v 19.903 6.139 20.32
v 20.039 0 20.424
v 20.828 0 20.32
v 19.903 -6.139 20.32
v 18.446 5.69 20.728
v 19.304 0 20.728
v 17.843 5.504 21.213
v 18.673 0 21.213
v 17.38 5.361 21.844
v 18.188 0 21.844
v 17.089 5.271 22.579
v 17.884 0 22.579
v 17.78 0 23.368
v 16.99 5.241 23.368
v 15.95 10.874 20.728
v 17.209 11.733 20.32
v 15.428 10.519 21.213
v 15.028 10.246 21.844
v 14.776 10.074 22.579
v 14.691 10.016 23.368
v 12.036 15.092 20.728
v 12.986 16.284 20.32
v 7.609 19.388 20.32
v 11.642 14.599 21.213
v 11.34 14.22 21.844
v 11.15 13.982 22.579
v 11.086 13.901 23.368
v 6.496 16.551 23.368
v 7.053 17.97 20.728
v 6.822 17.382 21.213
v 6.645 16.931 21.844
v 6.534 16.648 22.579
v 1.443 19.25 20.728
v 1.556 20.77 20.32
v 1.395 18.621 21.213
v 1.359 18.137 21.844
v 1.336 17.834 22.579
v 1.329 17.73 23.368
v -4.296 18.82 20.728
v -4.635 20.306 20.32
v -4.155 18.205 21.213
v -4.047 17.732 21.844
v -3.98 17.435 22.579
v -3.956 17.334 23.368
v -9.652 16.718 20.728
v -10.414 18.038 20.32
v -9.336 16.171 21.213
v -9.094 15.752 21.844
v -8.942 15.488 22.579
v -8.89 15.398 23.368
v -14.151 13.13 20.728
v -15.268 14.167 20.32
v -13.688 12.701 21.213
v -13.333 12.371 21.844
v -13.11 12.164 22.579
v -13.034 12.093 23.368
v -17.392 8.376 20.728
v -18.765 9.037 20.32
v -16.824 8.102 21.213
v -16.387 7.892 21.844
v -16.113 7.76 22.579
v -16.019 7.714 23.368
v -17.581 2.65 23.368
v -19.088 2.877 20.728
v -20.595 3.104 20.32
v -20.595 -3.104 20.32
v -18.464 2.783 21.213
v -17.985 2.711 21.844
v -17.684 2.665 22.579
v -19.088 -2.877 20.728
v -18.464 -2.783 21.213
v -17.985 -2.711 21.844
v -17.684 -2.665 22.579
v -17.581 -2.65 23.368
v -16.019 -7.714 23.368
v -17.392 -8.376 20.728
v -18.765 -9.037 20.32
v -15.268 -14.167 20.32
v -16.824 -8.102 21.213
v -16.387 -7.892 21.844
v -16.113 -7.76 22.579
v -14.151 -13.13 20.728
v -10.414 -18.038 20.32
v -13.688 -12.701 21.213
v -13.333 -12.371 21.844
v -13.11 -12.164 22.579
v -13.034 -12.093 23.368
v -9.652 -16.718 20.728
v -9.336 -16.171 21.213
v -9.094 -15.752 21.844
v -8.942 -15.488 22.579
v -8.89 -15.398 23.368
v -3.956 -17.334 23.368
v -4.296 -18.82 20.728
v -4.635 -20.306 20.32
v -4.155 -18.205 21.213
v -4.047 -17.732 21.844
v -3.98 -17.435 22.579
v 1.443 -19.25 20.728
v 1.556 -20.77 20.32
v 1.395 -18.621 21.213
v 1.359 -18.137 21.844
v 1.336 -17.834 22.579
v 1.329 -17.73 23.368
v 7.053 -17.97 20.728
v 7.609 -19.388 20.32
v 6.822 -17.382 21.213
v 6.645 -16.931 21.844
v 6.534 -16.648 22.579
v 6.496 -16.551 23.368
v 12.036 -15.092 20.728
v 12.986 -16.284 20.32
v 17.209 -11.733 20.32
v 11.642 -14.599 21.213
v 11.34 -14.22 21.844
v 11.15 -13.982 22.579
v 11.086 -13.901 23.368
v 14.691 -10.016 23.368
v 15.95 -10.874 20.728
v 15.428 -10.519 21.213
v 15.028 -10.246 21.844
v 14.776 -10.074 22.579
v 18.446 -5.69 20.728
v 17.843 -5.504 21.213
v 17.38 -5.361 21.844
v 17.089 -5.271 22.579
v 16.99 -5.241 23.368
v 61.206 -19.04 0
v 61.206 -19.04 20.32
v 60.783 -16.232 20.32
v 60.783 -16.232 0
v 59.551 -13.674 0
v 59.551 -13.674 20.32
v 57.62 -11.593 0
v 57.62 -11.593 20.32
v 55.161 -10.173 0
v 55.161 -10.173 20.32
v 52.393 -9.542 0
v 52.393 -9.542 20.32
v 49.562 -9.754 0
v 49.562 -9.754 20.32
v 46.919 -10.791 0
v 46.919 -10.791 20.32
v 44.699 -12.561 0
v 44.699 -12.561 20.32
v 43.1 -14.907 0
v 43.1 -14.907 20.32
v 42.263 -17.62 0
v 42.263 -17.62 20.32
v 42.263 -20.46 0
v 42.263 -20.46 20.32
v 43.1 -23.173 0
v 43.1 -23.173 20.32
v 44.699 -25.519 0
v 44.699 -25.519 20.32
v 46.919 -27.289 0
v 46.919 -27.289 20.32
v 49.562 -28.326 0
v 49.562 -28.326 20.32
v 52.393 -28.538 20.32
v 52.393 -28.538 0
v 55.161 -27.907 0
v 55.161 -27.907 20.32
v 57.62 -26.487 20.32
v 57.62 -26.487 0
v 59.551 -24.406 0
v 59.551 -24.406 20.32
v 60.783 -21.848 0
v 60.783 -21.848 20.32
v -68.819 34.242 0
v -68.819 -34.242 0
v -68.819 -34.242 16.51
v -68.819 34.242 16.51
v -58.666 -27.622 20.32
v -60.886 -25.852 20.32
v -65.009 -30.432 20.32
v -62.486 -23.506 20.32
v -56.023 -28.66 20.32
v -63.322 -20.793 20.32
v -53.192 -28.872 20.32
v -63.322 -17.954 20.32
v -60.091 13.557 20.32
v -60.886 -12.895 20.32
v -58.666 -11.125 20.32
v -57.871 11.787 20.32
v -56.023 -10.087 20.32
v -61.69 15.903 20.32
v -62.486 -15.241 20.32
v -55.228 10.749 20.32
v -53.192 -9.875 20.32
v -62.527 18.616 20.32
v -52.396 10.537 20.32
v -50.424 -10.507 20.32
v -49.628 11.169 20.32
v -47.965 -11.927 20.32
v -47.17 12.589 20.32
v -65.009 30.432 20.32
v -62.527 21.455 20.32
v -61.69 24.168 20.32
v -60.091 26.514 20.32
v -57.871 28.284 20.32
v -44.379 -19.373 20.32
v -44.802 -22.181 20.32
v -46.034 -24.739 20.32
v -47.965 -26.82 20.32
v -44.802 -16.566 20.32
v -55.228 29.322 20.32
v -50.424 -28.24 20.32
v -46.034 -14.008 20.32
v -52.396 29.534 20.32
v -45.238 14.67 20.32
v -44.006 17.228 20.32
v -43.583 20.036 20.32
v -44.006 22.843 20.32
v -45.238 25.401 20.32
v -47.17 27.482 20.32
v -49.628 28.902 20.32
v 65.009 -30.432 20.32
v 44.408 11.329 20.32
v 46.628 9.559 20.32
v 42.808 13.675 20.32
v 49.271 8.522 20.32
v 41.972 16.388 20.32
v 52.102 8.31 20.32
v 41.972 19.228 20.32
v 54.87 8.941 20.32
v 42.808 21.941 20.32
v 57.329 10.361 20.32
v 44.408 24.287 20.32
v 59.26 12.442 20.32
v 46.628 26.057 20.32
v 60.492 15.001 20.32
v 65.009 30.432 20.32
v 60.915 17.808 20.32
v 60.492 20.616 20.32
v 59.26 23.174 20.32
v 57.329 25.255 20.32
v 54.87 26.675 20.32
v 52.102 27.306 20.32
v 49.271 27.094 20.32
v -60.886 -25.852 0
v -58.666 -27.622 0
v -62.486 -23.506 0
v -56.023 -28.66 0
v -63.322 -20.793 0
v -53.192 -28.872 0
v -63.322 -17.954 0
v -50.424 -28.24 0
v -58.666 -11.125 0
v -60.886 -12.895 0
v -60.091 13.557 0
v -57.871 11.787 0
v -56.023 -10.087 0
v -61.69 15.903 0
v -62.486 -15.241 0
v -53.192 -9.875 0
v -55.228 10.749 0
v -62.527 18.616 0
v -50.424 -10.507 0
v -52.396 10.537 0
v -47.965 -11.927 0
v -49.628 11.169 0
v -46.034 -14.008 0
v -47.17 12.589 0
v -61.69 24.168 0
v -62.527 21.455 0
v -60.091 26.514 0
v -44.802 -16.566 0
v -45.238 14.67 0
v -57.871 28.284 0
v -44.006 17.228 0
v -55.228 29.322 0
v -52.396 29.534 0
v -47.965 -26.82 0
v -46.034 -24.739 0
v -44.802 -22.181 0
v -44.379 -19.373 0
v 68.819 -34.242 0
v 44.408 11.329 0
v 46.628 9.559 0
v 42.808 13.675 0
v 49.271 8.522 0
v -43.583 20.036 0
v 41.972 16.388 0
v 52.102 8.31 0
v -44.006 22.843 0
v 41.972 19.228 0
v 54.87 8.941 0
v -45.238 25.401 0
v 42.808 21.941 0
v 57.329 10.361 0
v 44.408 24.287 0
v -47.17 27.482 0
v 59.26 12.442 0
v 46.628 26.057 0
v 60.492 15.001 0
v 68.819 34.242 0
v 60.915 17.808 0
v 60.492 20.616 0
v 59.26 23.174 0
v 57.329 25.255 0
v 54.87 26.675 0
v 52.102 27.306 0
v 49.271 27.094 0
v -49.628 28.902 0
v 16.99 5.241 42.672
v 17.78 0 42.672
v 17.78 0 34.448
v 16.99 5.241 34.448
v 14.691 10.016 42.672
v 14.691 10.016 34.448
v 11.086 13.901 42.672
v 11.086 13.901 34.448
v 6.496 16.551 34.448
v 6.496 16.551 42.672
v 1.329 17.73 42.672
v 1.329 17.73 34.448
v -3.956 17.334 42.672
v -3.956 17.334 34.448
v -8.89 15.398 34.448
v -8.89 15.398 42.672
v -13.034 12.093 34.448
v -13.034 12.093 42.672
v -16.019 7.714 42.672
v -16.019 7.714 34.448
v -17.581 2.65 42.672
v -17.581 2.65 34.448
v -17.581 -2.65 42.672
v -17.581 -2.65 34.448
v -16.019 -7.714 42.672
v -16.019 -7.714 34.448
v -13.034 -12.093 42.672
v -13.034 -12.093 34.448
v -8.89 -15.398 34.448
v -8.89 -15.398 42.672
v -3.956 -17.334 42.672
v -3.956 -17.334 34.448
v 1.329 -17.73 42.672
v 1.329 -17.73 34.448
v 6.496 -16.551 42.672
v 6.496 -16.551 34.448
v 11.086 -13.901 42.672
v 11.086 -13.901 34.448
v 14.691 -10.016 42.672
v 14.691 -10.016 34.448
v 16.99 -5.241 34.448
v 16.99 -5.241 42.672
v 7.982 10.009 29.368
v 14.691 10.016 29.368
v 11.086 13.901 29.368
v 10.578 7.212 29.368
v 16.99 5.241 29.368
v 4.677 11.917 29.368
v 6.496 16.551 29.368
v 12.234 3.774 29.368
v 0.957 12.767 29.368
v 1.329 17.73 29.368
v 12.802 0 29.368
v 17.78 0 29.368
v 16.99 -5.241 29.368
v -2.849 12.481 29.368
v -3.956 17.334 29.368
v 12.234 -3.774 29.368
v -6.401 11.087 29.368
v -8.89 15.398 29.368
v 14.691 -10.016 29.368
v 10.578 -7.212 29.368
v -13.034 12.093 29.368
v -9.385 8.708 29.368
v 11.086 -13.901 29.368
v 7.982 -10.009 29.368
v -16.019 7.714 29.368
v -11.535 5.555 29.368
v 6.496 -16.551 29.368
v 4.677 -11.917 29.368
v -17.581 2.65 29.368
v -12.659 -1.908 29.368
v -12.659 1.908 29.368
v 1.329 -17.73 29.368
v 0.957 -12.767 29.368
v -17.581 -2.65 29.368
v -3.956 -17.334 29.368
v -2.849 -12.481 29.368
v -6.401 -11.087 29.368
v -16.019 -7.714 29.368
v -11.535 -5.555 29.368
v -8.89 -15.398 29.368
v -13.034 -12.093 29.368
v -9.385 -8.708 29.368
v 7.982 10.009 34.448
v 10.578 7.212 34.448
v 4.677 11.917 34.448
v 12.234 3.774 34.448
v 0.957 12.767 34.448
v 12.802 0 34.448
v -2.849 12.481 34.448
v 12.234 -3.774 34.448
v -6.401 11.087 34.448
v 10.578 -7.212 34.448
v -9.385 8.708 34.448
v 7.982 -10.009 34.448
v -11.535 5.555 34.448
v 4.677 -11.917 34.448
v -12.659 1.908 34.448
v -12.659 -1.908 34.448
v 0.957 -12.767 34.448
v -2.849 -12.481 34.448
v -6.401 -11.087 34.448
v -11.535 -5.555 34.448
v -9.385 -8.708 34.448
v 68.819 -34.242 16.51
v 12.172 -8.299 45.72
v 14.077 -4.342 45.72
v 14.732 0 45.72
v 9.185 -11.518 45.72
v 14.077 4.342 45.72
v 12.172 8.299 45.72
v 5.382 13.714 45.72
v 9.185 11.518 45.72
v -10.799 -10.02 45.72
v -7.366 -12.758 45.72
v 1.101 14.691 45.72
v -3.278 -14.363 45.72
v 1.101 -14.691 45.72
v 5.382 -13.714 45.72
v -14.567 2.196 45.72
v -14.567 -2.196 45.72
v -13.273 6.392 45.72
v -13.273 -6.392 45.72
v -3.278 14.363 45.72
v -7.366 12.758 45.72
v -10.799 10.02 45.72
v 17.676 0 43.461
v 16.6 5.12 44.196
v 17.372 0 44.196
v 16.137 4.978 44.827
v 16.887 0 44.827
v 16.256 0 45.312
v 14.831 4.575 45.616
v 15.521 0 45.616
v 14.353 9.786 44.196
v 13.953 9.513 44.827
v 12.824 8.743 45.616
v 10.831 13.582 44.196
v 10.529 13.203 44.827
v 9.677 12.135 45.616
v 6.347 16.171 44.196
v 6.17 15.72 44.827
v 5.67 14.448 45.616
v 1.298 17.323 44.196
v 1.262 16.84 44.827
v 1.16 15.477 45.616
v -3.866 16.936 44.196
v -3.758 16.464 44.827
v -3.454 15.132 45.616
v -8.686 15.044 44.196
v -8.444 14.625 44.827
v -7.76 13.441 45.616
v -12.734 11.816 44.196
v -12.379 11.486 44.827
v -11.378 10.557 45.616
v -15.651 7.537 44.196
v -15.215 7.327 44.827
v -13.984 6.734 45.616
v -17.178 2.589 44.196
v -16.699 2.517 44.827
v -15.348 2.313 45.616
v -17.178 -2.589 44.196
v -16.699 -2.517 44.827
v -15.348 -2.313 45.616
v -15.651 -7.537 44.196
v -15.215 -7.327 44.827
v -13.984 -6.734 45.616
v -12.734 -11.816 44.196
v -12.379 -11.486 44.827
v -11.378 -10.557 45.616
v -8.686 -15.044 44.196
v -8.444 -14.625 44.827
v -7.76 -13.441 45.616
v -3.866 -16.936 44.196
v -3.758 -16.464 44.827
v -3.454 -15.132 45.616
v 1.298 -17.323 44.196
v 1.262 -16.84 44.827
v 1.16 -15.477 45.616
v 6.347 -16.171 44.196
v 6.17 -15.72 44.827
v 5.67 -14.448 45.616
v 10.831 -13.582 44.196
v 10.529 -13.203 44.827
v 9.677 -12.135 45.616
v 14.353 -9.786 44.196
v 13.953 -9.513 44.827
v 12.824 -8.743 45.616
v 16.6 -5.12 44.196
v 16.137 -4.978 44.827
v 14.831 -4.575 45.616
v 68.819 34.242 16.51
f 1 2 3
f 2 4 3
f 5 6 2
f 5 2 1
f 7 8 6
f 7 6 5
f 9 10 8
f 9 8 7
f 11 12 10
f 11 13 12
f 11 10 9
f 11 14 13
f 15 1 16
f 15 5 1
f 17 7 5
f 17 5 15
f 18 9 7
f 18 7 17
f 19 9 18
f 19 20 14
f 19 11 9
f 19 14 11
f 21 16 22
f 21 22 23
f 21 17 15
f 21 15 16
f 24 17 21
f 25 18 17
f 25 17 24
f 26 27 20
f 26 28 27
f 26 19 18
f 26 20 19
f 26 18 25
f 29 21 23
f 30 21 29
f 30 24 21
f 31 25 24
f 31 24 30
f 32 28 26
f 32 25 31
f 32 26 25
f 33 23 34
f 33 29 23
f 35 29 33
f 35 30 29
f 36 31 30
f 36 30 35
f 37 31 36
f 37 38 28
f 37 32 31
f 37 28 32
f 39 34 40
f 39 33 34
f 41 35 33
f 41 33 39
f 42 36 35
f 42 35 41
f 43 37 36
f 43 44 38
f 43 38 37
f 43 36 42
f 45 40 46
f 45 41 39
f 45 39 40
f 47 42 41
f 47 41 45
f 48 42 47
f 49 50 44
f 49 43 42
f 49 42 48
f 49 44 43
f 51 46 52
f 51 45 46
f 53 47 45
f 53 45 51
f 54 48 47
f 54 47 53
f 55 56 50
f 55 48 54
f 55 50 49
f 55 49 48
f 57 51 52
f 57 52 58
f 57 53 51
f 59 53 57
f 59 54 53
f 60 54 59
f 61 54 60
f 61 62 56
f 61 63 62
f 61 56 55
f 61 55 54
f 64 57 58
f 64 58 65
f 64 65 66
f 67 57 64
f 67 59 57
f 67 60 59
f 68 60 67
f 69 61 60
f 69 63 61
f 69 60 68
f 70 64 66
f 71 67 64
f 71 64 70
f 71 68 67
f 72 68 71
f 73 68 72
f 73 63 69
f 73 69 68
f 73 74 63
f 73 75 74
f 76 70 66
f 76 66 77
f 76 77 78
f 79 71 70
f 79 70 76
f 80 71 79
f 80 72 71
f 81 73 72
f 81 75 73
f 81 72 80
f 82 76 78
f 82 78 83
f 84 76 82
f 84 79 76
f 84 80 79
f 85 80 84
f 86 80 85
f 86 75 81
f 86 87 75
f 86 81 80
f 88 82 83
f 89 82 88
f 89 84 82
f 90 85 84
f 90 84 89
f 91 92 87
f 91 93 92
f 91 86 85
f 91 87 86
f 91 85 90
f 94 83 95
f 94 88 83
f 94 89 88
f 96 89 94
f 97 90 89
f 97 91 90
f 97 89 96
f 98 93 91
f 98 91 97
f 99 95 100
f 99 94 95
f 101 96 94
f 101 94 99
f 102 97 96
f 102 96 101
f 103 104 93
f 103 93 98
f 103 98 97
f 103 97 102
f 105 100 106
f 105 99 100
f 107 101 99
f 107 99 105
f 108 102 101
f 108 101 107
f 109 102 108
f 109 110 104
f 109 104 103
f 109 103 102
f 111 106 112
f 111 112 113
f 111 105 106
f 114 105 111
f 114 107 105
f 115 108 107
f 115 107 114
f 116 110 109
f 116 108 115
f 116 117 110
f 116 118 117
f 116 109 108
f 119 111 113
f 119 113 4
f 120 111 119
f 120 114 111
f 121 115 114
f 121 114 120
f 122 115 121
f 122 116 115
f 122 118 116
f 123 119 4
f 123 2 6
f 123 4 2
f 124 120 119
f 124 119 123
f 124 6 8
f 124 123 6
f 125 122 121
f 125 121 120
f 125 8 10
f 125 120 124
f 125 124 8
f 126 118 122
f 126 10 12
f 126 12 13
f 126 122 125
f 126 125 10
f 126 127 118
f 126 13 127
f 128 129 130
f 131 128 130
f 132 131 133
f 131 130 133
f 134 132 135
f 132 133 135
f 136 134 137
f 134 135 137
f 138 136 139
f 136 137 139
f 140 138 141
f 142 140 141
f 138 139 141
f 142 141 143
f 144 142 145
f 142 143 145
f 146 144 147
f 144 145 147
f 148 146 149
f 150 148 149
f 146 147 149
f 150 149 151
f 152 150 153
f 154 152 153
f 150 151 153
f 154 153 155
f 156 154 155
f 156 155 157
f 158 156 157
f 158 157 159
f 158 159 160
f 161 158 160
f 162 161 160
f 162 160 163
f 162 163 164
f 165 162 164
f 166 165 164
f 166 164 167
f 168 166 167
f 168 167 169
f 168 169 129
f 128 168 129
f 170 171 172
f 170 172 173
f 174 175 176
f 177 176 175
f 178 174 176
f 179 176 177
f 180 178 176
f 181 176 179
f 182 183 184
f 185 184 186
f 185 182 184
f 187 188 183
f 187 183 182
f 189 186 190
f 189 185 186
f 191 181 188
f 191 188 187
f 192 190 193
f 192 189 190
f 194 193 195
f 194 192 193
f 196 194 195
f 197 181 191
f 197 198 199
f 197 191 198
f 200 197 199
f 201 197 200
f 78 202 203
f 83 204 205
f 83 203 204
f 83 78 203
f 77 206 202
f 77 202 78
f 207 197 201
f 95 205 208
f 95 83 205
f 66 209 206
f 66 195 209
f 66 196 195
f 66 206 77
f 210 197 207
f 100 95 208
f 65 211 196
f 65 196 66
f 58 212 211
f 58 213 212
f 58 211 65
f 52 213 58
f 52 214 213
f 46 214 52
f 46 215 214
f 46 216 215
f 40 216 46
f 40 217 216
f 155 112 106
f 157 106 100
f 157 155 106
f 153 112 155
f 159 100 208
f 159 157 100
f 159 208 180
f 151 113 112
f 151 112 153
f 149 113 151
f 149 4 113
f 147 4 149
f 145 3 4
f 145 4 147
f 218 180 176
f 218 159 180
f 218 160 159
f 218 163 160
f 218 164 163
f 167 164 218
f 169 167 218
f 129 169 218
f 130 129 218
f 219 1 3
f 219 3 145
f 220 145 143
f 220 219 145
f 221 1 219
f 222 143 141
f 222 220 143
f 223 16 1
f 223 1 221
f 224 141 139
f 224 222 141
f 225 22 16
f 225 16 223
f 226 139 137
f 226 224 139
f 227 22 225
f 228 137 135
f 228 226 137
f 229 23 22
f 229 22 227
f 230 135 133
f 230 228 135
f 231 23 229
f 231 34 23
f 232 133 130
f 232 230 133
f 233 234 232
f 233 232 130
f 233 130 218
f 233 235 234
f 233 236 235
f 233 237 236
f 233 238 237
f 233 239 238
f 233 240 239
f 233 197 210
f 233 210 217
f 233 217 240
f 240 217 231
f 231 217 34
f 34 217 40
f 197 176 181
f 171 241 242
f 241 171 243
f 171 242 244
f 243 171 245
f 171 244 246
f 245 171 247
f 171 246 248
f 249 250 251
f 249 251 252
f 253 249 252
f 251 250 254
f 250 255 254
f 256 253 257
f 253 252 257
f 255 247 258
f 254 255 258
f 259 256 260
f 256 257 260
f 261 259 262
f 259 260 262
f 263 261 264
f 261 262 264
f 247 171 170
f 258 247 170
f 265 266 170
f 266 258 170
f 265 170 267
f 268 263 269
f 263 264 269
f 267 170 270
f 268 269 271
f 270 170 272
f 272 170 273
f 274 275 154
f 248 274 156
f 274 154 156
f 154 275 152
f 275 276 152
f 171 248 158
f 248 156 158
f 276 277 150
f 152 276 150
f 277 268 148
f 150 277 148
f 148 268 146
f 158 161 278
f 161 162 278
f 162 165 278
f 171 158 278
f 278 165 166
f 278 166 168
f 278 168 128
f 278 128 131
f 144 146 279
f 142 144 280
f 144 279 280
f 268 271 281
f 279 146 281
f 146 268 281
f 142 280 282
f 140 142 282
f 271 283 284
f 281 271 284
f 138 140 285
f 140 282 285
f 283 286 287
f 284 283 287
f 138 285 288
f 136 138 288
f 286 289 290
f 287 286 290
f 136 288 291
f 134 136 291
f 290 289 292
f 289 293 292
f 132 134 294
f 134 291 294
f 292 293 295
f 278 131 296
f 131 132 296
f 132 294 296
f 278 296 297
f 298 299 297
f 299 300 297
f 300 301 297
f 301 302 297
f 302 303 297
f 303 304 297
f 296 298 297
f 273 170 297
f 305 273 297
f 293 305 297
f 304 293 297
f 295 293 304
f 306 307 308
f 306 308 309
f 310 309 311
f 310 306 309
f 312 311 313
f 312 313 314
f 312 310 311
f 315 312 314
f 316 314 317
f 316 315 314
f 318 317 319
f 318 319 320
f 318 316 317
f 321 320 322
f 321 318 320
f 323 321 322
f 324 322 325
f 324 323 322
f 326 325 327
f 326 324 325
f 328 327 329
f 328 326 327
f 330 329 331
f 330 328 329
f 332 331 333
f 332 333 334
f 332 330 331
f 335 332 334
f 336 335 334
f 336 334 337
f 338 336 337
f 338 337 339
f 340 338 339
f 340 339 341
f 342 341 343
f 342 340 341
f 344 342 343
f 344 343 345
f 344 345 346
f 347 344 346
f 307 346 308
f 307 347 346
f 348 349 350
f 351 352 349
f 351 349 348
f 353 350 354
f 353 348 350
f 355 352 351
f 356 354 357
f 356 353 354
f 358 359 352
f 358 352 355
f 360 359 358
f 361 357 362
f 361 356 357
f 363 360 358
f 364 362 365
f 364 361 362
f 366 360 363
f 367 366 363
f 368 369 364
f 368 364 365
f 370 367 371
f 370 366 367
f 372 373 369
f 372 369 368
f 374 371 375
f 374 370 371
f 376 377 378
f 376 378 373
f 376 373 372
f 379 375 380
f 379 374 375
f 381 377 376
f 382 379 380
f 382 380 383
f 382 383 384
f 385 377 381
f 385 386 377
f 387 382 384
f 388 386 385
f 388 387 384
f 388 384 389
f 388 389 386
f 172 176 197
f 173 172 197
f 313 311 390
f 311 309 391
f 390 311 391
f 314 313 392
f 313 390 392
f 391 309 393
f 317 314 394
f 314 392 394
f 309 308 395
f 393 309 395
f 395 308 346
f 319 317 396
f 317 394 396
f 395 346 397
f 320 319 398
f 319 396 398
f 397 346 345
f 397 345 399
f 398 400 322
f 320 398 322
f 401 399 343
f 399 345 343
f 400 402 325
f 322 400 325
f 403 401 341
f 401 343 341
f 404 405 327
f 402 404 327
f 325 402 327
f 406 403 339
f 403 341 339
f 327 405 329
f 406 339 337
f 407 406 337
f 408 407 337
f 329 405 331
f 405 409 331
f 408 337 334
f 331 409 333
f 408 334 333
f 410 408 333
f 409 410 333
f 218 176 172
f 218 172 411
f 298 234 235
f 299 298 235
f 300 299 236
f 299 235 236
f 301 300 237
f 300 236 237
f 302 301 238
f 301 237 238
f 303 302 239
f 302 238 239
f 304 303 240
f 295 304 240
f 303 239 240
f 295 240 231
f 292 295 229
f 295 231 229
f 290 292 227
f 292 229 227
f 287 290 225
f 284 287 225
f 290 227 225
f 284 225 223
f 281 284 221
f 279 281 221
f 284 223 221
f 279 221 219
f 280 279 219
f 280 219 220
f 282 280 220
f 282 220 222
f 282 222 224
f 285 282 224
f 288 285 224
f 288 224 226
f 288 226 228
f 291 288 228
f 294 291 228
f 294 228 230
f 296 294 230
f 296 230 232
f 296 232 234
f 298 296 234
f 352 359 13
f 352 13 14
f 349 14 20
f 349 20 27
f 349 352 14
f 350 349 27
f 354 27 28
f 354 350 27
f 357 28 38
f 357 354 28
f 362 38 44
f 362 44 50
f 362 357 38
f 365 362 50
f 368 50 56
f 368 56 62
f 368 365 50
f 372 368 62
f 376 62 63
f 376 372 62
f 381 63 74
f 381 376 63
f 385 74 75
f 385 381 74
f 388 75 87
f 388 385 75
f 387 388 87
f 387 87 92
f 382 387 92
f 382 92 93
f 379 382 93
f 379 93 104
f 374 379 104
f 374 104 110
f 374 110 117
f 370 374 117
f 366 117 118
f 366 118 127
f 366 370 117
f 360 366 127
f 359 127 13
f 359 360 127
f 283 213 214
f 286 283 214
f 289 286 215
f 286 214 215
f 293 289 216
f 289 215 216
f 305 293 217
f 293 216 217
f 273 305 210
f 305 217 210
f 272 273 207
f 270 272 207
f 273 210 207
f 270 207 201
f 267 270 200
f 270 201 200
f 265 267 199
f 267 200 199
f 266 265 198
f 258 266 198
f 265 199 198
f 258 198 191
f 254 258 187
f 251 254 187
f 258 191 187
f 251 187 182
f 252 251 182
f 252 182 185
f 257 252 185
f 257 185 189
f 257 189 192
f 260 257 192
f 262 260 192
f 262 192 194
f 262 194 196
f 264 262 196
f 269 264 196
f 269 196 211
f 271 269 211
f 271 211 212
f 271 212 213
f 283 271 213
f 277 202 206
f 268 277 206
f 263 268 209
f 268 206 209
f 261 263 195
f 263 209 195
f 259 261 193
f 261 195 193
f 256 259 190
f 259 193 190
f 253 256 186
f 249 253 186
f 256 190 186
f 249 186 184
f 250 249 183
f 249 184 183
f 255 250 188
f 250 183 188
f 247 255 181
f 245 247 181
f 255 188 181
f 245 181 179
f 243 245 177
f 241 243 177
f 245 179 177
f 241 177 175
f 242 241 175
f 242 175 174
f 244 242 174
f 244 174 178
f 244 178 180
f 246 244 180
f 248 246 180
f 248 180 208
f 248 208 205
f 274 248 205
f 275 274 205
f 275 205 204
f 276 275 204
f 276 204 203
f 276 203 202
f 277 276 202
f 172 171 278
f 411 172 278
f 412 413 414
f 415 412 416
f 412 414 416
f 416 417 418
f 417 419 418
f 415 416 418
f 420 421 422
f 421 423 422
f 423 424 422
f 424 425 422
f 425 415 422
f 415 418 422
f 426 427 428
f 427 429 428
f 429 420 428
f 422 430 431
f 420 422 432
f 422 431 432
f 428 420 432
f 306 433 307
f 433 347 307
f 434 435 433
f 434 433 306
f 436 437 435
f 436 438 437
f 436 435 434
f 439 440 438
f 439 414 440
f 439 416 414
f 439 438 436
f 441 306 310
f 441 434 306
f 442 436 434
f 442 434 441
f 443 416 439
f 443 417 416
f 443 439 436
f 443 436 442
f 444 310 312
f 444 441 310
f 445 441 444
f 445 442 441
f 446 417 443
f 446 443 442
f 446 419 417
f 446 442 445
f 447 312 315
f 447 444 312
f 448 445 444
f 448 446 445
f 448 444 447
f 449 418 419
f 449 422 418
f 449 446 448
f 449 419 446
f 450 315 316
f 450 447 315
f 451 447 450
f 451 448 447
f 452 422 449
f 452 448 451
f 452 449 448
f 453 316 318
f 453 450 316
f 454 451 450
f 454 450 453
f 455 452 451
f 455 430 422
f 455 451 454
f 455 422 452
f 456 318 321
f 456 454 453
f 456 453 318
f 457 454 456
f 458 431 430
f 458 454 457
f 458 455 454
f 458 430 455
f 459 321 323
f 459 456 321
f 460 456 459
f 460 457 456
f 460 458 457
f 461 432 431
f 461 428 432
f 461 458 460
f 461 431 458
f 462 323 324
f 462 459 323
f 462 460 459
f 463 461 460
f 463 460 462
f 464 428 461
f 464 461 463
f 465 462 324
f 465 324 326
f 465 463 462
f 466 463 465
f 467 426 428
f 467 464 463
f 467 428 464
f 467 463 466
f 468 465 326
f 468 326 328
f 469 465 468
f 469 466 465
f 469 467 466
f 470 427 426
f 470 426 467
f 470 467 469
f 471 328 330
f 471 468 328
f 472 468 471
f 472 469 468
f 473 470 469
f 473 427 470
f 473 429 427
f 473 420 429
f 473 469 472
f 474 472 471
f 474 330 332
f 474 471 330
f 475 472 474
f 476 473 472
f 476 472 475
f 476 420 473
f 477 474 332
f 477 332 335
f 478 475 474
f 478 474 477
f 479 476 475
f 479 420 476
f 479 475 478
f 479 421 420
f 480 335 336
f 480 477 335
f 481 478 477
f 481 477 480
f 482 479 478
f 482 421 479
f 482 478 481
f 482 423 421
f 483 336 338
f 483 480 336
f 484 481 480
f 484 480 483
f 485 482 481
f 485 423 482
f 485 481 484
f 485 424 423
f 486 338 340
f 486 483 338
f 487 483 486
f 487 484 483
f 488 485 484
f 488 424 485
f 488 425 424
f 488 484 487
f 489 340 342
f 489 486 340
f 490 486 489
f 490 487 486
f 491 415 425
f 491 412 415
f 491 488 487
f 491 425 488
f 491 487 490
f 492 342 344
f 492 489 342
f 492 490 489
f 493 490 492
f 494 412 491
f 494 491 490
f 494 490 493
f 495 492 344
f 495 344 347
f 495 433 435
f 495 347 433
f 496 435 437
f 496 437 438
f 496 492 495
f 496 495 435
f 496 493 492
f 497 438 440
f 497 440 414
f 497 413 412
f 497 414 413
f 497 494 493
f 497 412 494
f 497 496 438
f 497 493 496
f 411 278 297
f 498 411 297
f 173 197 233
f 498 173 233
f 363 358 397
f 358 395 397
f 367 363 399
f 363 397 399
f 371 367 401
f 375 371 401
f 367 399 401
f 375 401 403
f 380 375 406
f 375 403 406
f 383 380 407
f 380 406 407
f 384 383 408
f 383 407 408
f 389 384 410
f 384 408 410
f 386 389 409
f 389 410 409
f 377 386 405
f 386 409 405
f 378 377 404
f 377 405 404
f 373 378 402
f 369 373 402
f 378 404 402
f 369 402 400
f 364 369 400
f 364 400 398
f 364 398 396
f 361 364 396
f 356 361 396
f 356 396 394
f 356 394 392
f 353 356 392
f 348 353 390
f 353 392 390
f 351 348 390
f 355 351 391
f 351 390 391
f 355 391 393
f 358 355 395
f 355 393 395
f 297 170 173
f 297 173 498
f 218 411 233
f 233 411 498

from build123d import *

# Parameters (mm, degrees)
F0_W     = 137.63725
F0_H     = 68.484548
F1_DEPTH = 20.32
F2_R     = 9.525
F3_DEPTH = 25.4
F4_W     = 17.78
F4_H     = 25.4
F6_W     = 5.08
F6_H     = 5.08
F8_SIZE  = 3.81
F9_R     = 3.048


with BuildPart() as f1:
    # F0 (on Top) → F1 (new body)
    with BuildSketch(Plane.XY):
        Rectangle(F0_W, F0_H)
    extrude(amount=F1_DEPTH)

    # F2 (on face) → F3 (cut)
    with BuildSketch(Plane.XY.offset(20.32)):
        with Locations((51.390208, 17.808059)):
            Circle(F2_R)
        with Locations((-53.108271, 20.035554)):
            Circle(F2_R)
        with Locations((-53.903826, -19.373486)):
            Circle(F2_R)
        with Locations((51.681355, -19.040003)):
            Circle(F2_R)
    extrude(amount=-F3_DEPTH, mode=Mode.SUBTRACT)

    # F4 (on Front) → F5 (revolve)
    with BuildSketch(Plane.XZ):
        with Locations((8.89, 33.02)):
            Rectangle(F4_W, F4_H)
    revolve(axis=Axis((0, 0, 33.02), (0, 0, 1)))

    # F6 (on Front) → F7 (revolve, cut)
    with BuildSketch(Plane.XZ):
        with Locations((15.342483, 31.907923)):
            Rectangle(F6_W, F6_H)
    revolve(axis=Axis((0, 0, 43.360371), (0, 0, -1)), mode=Mode.SUBTRACT)

    # F8
    f8_edges = [f1.edges().sort_by_distance(p)[0] for p in [
        (0, -34.242274, 20.32),
        (0, 34.242274, 20.32),
        (68.818625, 0, 20.32),
        (-68.818625, 0, 20.32),
    ]]
    chamfer(f8_edges, length=F8_SIZE)

    # F9
    f9_edges = [f1.edges().sort_by_distance(p)[0] for p in [
        (-17.78, 0, 45.72),
        (-17.78, 0, 20.32),
    ]]
    fillet(f9_edges, radius=F9_R)


solid = f1.part
